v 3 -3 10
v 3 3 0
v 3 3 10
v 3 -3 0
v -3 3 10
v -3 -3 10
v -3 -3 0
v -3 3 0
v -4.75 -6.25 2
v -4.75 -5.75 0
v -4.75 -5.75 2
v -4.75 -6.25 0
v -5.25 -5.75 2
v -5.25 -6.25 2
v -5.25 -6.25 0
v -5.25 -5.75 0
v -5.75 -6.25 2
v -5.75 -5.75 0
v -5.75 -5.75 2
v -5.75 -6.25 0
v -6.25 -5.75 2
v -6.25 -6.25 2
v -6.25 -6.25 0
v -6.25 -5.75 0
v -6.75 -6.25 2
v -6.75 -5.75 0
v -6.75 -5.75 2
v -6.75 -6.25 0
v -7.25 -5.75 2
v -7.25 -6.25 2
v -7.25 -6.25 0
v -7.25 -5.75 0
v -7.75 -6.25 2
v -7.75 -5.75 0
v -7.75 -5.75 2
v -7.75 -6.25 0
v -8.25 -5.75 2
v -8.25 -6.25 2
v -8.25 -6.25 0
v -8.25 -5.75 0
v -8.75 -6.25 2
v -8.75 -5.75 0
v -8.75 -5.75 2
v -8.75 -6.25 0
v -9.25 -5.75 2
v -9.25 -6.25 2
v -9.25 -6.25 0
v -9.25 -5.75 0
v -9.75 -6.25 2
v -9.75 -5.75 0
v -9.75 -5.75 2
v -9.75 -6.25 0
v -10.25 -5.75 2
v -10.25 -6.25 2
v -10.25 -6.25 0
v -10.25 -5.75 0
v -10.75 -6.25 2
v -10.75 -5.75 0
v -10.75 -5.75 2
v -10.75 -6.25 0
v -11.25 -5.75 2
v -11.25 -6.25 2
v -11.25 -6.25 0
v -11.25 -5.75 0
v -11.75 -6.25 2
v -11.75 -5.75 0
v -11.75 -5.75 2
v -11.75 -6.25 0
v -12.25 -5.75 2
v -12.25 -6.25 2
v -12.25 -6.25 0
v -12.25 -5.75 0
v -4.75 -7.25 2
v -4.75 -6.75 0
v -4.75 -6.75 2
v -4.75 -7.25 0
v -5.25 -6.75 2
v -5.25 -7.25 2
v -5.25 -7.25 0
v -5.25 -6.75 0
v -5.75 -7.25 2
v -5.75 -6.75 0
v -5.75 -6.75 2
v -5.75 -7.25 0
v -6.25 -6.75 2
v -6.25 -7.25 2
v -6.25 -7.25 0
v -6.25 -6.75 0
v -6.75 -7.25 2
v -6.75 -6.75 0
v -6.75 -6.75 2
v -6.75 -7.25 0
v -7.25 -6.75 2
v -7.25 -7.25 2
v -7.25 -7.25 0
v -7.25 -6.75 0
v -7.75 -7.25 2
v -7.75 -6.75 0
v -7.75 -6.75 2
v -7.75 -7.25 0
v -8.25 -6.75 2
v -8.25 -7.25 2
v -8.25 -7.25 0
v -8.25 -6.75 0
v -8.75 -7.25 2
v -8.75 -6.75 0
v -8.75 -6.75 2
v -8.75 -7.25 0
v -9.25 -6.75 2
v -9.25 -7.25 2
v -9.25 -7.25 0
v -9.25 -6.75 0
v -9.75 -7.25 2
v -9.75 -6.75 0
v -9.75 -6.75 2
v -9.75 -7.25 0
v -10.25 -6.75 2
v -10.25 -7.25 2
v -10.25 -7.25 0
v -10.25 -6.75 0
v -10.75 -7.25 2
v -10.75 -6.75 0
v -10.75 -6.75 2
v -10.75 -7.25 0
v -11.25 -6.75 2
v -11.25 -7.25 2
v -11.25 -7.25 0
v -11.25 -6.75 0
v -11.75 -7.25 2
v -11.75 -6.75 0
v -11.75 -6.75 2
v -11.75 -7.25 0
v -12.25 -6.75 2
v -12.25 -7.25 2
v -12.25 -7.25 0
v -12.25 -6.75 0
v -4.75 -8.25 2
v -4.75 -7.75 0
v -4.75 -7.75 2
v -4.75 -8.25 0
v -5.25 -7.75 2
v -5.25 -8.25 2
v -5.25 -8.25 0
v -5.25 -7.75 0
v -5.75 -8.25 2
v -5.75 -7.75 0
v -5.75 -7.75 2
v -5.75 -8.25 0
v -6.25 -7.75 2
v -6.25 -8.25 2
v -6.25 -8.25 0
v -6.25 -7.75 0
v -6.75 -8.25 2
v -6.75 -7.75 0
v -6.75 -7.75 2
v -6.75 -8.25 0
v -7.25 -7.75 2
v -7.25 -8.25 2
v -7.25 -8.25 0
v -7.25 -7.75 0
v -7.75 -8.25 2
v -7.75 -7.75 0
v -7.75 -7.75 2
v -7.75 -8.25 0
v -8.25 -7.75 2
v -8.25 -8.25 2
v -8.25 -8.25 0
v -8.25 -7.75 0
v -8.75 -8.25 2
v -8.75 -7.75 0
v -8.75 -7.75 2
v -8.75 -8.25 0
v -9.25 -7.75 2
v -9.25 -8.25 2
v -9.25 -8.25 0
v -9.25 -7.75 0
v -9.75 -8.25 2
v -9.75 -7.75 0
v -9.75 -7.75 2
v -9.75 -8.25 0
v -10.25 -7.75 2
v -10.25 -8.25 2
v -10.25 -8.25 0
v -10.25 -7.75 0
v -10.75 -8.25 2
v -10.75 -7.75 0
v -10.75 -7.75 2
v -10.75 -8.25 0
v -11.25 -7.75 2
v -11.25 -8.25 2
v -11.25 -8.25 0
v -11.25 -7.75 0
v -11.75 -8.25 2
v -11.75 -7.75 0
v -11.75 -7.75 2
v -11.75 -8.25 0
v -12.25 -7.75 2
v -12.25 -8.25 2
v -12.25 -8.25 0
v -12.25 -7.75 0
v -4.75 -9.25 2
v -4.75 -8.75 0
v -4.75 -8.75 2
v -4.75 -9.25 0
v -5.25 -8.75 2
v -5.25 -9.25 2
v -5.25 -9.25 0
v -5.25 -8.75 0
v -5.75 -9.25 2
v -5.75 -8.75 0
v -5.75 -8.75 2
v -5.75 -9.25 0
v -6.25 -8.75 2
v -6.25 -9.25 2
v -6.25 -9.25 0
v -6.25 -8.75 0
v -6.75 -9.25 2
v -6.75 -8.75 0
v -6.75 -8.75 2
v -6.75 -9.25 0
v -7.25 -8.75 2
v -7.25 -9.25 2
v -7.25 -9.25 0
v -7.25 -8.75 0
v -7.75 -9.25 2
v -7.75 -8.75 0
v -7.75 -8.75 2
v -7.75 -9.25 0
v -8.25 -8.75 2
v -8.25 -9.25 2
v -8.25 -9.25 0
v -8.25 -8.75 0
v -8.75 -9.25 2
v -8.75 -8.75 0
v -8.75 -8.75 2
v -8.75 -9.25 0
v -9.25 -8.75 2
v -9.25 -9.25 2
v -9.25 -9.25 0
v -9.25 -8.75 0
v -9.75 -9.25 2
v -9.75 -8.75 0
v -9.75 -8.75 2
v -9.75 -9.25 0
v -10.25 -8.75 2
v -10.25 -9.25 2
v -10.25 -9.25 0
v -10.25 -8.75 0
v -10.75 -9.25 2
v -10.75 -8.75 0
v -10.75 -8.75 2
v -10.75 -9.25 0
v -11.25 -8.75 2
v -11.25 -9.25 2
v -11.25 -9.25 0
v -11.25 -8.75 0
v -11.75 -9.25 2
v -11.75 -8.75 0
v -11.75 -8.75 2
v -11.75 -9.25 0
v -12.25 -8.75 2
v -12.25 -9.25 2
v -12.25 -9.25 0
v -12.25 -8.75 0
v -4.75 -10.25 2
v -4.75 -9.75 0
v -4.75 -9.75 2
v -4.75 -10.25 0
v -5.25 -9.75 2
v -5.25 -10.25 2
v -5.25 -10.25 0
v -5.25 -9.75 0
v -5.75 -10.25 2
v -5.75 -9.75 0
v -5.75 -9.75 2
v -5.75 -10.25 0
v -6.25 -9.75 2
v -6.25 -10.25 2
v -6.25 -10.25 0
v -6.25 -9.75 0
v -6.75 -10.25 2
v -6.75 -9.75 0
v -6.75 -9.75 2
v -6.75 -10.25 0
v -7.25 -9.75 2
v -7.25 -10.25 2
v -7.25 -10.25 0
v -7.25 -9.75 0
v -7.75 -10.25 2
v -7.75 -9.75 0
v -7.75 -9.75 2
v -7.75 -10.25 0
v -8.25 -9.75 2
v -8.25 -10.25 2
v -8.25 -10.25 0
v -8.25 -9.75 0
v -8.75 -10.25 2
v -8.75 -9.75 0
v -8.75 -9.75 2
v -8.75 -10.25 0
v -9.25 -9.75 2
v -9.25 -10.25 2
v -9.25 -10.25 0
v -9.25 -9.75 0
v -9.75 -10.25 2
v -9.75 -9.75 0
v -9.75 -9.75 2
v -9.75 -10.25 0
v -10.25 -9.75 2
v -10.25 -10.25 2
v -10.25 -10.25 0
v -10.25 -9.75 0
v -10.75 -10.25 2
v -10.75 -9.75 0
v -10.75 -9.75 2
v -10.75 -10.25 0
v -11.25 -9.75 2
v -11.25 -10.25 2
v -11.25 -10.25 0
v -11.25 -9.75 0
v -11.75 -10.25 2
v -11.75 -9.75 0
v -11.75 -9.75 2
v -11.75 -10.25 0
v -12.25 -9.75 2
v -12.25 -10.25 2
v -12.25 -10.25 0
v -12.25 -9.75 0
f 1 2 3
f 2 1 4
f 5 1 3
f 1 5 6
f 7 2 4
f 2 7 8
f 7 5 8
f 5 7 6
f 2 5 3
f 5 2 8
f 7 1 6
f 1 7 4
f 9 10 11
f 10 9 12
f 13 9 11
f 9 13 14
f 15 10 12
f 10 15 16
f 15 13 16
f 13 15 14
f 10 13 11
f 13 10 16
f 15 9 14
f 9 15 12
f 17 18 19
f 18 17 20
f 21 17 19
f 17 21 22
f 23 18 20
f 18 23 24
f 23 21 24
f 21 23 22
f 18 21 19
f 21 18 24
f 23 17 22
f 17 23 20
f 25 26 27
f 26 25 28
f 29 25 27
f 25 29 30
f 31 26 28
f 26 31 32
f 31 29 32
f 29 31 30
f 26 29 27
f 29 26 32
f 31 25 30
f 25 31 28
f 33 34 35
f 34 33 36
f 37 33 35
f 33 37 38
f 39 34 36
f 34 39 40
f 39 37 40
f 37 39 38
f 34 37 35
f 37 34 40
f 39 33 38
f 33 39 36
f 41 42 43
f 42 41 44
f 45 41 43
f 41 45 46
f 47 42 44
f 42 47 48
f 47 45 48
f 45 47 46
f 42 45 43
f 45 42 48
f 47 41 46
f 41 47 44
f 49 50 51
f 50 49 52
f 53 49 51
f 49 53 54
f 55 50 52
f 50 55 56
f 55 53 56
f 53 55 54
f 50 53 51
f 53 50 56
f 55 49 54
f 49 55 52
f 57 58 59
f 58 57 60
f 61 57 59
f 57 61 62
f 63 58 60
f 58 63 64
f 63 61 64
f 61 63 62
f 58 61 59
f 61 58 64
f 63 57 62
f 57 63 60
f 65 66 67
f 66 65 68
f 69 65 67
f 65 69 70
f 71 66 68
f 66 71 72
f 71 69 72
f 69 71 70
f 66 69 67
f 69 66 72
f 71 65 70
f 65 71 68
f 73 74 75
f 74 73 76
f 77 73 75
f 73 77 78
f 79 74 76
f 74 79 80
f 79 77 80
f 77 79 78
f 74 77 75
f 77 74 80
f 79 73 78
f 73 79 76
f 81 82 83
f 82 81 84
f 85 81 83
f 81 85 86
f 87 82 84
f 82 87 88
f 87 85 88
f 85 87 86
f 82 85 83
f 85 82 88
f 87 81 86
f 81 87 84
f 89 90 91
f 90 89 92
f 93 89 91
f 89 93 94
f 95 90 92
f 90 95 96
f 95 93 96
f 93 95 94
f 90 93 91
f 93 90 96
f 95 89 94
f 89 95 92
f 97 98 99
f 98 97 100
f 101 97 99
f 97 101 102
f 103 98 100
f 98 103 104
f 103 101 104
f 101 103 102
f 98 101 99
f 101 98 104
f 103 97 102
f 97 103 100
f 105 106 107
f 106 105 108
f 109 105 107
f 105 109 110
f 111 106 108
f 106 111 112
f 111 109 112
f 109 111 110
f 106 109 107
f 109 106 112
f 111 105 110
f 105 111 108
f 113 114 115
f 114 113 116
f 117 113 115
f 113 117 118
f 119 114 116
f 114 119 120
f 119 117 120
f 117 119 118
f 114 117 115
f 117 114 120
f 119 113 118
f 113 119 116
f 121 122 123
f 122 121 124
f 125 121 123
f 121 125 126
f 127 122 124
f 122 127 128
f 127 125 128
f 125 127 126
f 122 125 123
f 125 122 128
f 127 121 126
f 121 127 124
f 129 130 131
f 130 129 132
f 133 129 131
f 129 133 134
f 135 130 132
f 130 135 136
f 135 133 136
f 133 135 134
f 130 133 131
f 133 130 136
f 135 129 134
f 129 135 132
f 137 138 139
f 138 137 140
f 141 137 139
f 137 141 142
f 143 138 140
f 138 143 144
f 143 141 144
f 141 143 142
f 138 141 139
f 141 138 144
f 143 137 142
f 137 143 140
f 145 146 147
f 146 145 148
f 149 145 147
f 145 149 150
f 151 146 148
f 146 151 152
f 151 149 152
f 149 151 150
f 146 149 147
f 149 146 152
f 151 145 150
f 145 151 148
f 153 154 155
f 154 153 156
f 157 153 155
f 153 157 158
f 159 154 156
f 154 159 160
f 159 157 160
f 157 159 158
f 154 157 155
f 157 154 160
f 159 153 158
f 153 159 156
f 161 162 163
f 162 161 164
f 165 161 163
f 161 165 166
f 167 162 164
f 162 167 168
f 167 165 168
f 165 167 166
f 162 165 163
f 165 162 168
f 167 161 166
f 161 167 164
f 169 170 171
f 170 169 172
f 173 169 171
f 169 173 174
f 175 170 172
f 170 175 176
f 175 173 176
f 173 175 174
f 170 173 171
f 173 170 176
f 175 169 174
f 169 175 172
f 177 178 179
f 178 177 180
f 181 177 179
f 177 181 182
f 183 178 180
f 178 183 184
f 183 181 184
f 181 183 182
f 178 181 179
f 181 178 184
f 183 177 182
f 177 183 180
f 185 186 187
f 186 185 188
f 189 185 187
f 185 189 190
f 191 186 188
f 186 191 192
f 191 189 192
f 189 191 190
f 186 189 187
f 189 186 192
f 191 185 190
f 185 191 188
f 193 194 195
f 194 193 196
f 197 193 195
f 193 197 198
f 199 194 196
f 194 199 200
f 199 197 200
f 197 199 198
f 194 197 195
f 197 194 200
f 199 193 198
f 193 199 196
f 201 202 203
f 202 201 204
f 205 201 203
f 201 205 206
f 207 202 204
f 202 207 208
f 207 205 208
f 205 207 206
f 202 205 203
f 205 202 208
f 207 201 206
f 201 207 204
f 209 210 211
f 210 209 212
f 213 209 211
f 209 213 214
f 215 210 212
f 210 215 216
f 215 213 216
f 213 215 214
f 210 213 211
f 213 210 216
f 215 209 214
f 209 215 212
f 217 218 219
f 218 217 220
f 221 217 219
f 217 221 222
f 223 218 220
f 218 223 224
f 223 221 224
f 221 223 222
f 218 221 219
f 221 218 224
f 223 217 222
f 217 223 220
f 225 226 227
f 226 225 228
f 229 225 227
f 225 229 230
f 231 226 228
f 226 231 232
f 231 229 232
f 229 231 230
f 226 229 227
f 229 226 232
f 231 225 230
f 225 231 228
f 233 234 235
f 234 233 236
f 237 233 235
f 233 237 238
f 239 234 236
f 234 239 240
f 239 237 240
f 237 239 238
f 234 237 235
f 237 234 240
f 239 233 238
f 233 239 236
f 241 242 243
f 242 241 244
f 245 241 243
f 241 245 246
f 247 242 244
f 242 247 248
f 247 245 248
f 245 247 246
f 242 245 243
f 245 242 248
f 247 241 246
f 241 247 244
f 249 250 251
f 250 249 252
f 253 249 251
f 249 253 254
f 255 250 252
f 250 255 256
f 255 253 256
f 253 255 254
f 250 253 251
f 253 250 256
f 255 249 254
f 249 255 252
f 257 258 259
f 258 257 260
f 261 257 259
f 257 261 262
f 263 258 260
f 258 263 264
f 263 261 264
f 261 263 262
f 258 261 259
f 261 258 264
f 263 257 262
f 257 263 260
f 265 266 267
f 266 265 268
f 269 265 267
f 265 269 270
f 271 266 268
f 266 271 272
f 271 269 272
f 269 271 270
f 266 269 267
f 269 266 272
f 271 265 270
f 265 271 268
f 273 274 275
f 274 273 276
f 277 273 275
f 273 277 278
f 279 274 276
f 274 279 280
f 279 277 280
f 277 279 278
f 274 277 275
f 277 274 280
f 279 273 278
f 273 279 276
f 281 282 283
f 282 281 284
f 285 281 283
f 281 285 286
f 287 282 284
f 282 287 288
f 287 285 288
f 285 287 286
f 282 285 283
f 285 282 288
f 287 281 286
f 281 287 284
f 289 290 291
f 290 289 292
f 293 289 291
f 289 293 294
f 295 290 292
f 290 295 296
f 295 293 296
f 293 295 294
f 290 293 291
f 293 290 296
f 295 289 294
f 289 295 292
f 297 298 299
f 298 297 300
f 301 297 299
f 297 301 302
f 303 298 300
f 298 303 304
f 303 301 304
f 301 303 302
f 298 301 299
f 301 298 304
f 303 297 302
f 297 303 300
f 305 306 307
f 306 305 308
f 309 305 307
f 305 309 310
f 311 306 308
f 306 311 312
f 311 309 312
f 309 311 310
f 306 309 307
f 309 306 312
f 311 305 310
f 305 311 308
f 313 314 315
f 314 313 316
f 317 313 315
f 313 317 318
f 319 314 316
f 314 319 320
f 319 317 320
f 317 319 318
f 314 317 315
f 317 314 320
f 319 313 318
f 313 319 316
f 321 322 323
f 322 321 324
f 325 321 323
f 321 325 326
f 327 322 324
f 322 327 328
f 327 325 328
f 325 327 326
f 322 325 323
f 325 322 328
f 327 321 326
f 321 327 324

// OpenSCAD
translate([0, 0, 5]) color([0,1,0,0.9]) cube([6, 6, 10], center=true);
translate([-5, -6, 1]) color([1,0,0]) cube([0.5, 0.5, 2], center=true);
translate([-6, -6, 1]) color([1,0,0]) cube([0.5, 0.5, 2], center=true);
translate([-7, -6, 1]) color([1,0,0]) cube([0.5, 0.5, 2], center=true);
translate([-8, -6, 1]) color([1,0,0]) cube([0.5, 0.5, 2], center=true);
translate([-9, -6, 1]) color([1,0,0]) cube([0.5, 0.5, 2], center=true);
translate([-10, -6, 1]) color([1,0,0]) cube([0.5, 0.5, 2], center=true);
translate([-11, -6, 1]) color([1,0,0]) cube([0.5, 0.5, 2], center=true);
translate([-12, -6, 1]) color([1,0,0]) cube([0.5, 0.5, 2], center=true);
translate([-5, -7, 1]) color([1,0,0]) cube([0.5, 0.5, 2], center=true);
translate([-6, -7, 1]) color([1,0,0]) cube([0.5, 0.5, 2], center=true);
translate([-7, -7, 1]) color([1,0,0]) cube([0.5, 0.5, 2], center=true);
translate([-8, -7, 1]) color([1,0,0]) cube([0.5, 0.5, 2], center=true);
translate([-9, -7, 1]) color([1,0,0]) cube([0.5, 0.5, 2], center=true);
translate([-10, -7, 1]) color([1,0,0]) cube([0.5, 0.5, 2], center=true);
translate([-11, -7, 1]) color([1,0,0]) cube([0.5, 0.5, 2], center=true);
translate([-12, -7, 1]) color([1,0,0]) cube([0.5, 0.5, 2], center=true);
translate([-5, -8, 1]) color([1,0,0]) cube([0.5, 0.5, 2], center=true);
translate([-6, -8, 1]) color([1,0,0]) cube([0.5, 0.5, 2], center=true);
translate([-7, -8, 1]) color([1,0,0]) cube([0.5, 0.5, 2], center=true);
translate([-8, -8, 1]) color([1,0,0]) cube([0.5, 0.5, 2], center=true);
translate([-9, -8, 1]) color([1,0,0]) cube([0.5, 0.5, 2], center=true);
translate([-10, -8, 1]) color([1,0,0]) cube([0.5, 0.5, 2], center=true);
translate([-11, -8, 1]) color([1,0,0]) cube([0.5, 0.5, 2], center=true);
translate([-12, -8, 1]) color([1,0,0]) cube([0.5, 0.5, 2], center=true);
translate([-5, -9, 1]) color([1,0,0]) cube([0.5, 0.5, 2], center=true);
translate([-6, -9, 1]) color([1,0,0]) cube([0.5, 0.5, 2], center=true);
translate([-7, -9, 1]) color([1,0,0]) cube([0.5, 0.5, 2], center=true);
translate([-8, -9, 1]) color([1,0,0]) cube([0.5, 0.5, 2], center=true);
translate([-9, -9, 1]) color([1,0,0]) cube([0.5, 0.5, 2], center=true);
translate([-10, -9, 1]) color([1,0,0]) cube([0.5, 0.5, 2], center=true);
translate([-11, -9, 1]) color([1,0,0]) cube([0.5, 0.5, 2], center=true);
translate([-12, -9, 1]) color([1,0,0]) cube([0.5, 0.5, 2], center=true);
translate([-5, -10, 1]) color([1,0,0]) cube([0.5, 0.5, 2], center=true);
translate([-6, -10, 1]) color([1,0,0]) cube([0.5, 0.5, 2], center=true);
translate([-7, -10, 1]) color([1,0,0]) cube([0.5, 0.5, 2], center=true);
translate([-8, -10, 1]) color([1,0,0]) cube([0.5, 0.5, 2], center=true);
translate([-9, -10, 1]) color([1,0,0]) cube([0.5, 0.5, 2], center=true);
translate([-10, -10, 1]) color([1,0,0]) cube([0.5, 0.5, 2], center=true);
translate([-11, -10, 1]) color([1,0,0]) cube([0.5, 0.5, 2], center=true);
translate([-12, -10, 1]) color([1,0,0]) cube([0.5, 0.5, 2], center=true);
